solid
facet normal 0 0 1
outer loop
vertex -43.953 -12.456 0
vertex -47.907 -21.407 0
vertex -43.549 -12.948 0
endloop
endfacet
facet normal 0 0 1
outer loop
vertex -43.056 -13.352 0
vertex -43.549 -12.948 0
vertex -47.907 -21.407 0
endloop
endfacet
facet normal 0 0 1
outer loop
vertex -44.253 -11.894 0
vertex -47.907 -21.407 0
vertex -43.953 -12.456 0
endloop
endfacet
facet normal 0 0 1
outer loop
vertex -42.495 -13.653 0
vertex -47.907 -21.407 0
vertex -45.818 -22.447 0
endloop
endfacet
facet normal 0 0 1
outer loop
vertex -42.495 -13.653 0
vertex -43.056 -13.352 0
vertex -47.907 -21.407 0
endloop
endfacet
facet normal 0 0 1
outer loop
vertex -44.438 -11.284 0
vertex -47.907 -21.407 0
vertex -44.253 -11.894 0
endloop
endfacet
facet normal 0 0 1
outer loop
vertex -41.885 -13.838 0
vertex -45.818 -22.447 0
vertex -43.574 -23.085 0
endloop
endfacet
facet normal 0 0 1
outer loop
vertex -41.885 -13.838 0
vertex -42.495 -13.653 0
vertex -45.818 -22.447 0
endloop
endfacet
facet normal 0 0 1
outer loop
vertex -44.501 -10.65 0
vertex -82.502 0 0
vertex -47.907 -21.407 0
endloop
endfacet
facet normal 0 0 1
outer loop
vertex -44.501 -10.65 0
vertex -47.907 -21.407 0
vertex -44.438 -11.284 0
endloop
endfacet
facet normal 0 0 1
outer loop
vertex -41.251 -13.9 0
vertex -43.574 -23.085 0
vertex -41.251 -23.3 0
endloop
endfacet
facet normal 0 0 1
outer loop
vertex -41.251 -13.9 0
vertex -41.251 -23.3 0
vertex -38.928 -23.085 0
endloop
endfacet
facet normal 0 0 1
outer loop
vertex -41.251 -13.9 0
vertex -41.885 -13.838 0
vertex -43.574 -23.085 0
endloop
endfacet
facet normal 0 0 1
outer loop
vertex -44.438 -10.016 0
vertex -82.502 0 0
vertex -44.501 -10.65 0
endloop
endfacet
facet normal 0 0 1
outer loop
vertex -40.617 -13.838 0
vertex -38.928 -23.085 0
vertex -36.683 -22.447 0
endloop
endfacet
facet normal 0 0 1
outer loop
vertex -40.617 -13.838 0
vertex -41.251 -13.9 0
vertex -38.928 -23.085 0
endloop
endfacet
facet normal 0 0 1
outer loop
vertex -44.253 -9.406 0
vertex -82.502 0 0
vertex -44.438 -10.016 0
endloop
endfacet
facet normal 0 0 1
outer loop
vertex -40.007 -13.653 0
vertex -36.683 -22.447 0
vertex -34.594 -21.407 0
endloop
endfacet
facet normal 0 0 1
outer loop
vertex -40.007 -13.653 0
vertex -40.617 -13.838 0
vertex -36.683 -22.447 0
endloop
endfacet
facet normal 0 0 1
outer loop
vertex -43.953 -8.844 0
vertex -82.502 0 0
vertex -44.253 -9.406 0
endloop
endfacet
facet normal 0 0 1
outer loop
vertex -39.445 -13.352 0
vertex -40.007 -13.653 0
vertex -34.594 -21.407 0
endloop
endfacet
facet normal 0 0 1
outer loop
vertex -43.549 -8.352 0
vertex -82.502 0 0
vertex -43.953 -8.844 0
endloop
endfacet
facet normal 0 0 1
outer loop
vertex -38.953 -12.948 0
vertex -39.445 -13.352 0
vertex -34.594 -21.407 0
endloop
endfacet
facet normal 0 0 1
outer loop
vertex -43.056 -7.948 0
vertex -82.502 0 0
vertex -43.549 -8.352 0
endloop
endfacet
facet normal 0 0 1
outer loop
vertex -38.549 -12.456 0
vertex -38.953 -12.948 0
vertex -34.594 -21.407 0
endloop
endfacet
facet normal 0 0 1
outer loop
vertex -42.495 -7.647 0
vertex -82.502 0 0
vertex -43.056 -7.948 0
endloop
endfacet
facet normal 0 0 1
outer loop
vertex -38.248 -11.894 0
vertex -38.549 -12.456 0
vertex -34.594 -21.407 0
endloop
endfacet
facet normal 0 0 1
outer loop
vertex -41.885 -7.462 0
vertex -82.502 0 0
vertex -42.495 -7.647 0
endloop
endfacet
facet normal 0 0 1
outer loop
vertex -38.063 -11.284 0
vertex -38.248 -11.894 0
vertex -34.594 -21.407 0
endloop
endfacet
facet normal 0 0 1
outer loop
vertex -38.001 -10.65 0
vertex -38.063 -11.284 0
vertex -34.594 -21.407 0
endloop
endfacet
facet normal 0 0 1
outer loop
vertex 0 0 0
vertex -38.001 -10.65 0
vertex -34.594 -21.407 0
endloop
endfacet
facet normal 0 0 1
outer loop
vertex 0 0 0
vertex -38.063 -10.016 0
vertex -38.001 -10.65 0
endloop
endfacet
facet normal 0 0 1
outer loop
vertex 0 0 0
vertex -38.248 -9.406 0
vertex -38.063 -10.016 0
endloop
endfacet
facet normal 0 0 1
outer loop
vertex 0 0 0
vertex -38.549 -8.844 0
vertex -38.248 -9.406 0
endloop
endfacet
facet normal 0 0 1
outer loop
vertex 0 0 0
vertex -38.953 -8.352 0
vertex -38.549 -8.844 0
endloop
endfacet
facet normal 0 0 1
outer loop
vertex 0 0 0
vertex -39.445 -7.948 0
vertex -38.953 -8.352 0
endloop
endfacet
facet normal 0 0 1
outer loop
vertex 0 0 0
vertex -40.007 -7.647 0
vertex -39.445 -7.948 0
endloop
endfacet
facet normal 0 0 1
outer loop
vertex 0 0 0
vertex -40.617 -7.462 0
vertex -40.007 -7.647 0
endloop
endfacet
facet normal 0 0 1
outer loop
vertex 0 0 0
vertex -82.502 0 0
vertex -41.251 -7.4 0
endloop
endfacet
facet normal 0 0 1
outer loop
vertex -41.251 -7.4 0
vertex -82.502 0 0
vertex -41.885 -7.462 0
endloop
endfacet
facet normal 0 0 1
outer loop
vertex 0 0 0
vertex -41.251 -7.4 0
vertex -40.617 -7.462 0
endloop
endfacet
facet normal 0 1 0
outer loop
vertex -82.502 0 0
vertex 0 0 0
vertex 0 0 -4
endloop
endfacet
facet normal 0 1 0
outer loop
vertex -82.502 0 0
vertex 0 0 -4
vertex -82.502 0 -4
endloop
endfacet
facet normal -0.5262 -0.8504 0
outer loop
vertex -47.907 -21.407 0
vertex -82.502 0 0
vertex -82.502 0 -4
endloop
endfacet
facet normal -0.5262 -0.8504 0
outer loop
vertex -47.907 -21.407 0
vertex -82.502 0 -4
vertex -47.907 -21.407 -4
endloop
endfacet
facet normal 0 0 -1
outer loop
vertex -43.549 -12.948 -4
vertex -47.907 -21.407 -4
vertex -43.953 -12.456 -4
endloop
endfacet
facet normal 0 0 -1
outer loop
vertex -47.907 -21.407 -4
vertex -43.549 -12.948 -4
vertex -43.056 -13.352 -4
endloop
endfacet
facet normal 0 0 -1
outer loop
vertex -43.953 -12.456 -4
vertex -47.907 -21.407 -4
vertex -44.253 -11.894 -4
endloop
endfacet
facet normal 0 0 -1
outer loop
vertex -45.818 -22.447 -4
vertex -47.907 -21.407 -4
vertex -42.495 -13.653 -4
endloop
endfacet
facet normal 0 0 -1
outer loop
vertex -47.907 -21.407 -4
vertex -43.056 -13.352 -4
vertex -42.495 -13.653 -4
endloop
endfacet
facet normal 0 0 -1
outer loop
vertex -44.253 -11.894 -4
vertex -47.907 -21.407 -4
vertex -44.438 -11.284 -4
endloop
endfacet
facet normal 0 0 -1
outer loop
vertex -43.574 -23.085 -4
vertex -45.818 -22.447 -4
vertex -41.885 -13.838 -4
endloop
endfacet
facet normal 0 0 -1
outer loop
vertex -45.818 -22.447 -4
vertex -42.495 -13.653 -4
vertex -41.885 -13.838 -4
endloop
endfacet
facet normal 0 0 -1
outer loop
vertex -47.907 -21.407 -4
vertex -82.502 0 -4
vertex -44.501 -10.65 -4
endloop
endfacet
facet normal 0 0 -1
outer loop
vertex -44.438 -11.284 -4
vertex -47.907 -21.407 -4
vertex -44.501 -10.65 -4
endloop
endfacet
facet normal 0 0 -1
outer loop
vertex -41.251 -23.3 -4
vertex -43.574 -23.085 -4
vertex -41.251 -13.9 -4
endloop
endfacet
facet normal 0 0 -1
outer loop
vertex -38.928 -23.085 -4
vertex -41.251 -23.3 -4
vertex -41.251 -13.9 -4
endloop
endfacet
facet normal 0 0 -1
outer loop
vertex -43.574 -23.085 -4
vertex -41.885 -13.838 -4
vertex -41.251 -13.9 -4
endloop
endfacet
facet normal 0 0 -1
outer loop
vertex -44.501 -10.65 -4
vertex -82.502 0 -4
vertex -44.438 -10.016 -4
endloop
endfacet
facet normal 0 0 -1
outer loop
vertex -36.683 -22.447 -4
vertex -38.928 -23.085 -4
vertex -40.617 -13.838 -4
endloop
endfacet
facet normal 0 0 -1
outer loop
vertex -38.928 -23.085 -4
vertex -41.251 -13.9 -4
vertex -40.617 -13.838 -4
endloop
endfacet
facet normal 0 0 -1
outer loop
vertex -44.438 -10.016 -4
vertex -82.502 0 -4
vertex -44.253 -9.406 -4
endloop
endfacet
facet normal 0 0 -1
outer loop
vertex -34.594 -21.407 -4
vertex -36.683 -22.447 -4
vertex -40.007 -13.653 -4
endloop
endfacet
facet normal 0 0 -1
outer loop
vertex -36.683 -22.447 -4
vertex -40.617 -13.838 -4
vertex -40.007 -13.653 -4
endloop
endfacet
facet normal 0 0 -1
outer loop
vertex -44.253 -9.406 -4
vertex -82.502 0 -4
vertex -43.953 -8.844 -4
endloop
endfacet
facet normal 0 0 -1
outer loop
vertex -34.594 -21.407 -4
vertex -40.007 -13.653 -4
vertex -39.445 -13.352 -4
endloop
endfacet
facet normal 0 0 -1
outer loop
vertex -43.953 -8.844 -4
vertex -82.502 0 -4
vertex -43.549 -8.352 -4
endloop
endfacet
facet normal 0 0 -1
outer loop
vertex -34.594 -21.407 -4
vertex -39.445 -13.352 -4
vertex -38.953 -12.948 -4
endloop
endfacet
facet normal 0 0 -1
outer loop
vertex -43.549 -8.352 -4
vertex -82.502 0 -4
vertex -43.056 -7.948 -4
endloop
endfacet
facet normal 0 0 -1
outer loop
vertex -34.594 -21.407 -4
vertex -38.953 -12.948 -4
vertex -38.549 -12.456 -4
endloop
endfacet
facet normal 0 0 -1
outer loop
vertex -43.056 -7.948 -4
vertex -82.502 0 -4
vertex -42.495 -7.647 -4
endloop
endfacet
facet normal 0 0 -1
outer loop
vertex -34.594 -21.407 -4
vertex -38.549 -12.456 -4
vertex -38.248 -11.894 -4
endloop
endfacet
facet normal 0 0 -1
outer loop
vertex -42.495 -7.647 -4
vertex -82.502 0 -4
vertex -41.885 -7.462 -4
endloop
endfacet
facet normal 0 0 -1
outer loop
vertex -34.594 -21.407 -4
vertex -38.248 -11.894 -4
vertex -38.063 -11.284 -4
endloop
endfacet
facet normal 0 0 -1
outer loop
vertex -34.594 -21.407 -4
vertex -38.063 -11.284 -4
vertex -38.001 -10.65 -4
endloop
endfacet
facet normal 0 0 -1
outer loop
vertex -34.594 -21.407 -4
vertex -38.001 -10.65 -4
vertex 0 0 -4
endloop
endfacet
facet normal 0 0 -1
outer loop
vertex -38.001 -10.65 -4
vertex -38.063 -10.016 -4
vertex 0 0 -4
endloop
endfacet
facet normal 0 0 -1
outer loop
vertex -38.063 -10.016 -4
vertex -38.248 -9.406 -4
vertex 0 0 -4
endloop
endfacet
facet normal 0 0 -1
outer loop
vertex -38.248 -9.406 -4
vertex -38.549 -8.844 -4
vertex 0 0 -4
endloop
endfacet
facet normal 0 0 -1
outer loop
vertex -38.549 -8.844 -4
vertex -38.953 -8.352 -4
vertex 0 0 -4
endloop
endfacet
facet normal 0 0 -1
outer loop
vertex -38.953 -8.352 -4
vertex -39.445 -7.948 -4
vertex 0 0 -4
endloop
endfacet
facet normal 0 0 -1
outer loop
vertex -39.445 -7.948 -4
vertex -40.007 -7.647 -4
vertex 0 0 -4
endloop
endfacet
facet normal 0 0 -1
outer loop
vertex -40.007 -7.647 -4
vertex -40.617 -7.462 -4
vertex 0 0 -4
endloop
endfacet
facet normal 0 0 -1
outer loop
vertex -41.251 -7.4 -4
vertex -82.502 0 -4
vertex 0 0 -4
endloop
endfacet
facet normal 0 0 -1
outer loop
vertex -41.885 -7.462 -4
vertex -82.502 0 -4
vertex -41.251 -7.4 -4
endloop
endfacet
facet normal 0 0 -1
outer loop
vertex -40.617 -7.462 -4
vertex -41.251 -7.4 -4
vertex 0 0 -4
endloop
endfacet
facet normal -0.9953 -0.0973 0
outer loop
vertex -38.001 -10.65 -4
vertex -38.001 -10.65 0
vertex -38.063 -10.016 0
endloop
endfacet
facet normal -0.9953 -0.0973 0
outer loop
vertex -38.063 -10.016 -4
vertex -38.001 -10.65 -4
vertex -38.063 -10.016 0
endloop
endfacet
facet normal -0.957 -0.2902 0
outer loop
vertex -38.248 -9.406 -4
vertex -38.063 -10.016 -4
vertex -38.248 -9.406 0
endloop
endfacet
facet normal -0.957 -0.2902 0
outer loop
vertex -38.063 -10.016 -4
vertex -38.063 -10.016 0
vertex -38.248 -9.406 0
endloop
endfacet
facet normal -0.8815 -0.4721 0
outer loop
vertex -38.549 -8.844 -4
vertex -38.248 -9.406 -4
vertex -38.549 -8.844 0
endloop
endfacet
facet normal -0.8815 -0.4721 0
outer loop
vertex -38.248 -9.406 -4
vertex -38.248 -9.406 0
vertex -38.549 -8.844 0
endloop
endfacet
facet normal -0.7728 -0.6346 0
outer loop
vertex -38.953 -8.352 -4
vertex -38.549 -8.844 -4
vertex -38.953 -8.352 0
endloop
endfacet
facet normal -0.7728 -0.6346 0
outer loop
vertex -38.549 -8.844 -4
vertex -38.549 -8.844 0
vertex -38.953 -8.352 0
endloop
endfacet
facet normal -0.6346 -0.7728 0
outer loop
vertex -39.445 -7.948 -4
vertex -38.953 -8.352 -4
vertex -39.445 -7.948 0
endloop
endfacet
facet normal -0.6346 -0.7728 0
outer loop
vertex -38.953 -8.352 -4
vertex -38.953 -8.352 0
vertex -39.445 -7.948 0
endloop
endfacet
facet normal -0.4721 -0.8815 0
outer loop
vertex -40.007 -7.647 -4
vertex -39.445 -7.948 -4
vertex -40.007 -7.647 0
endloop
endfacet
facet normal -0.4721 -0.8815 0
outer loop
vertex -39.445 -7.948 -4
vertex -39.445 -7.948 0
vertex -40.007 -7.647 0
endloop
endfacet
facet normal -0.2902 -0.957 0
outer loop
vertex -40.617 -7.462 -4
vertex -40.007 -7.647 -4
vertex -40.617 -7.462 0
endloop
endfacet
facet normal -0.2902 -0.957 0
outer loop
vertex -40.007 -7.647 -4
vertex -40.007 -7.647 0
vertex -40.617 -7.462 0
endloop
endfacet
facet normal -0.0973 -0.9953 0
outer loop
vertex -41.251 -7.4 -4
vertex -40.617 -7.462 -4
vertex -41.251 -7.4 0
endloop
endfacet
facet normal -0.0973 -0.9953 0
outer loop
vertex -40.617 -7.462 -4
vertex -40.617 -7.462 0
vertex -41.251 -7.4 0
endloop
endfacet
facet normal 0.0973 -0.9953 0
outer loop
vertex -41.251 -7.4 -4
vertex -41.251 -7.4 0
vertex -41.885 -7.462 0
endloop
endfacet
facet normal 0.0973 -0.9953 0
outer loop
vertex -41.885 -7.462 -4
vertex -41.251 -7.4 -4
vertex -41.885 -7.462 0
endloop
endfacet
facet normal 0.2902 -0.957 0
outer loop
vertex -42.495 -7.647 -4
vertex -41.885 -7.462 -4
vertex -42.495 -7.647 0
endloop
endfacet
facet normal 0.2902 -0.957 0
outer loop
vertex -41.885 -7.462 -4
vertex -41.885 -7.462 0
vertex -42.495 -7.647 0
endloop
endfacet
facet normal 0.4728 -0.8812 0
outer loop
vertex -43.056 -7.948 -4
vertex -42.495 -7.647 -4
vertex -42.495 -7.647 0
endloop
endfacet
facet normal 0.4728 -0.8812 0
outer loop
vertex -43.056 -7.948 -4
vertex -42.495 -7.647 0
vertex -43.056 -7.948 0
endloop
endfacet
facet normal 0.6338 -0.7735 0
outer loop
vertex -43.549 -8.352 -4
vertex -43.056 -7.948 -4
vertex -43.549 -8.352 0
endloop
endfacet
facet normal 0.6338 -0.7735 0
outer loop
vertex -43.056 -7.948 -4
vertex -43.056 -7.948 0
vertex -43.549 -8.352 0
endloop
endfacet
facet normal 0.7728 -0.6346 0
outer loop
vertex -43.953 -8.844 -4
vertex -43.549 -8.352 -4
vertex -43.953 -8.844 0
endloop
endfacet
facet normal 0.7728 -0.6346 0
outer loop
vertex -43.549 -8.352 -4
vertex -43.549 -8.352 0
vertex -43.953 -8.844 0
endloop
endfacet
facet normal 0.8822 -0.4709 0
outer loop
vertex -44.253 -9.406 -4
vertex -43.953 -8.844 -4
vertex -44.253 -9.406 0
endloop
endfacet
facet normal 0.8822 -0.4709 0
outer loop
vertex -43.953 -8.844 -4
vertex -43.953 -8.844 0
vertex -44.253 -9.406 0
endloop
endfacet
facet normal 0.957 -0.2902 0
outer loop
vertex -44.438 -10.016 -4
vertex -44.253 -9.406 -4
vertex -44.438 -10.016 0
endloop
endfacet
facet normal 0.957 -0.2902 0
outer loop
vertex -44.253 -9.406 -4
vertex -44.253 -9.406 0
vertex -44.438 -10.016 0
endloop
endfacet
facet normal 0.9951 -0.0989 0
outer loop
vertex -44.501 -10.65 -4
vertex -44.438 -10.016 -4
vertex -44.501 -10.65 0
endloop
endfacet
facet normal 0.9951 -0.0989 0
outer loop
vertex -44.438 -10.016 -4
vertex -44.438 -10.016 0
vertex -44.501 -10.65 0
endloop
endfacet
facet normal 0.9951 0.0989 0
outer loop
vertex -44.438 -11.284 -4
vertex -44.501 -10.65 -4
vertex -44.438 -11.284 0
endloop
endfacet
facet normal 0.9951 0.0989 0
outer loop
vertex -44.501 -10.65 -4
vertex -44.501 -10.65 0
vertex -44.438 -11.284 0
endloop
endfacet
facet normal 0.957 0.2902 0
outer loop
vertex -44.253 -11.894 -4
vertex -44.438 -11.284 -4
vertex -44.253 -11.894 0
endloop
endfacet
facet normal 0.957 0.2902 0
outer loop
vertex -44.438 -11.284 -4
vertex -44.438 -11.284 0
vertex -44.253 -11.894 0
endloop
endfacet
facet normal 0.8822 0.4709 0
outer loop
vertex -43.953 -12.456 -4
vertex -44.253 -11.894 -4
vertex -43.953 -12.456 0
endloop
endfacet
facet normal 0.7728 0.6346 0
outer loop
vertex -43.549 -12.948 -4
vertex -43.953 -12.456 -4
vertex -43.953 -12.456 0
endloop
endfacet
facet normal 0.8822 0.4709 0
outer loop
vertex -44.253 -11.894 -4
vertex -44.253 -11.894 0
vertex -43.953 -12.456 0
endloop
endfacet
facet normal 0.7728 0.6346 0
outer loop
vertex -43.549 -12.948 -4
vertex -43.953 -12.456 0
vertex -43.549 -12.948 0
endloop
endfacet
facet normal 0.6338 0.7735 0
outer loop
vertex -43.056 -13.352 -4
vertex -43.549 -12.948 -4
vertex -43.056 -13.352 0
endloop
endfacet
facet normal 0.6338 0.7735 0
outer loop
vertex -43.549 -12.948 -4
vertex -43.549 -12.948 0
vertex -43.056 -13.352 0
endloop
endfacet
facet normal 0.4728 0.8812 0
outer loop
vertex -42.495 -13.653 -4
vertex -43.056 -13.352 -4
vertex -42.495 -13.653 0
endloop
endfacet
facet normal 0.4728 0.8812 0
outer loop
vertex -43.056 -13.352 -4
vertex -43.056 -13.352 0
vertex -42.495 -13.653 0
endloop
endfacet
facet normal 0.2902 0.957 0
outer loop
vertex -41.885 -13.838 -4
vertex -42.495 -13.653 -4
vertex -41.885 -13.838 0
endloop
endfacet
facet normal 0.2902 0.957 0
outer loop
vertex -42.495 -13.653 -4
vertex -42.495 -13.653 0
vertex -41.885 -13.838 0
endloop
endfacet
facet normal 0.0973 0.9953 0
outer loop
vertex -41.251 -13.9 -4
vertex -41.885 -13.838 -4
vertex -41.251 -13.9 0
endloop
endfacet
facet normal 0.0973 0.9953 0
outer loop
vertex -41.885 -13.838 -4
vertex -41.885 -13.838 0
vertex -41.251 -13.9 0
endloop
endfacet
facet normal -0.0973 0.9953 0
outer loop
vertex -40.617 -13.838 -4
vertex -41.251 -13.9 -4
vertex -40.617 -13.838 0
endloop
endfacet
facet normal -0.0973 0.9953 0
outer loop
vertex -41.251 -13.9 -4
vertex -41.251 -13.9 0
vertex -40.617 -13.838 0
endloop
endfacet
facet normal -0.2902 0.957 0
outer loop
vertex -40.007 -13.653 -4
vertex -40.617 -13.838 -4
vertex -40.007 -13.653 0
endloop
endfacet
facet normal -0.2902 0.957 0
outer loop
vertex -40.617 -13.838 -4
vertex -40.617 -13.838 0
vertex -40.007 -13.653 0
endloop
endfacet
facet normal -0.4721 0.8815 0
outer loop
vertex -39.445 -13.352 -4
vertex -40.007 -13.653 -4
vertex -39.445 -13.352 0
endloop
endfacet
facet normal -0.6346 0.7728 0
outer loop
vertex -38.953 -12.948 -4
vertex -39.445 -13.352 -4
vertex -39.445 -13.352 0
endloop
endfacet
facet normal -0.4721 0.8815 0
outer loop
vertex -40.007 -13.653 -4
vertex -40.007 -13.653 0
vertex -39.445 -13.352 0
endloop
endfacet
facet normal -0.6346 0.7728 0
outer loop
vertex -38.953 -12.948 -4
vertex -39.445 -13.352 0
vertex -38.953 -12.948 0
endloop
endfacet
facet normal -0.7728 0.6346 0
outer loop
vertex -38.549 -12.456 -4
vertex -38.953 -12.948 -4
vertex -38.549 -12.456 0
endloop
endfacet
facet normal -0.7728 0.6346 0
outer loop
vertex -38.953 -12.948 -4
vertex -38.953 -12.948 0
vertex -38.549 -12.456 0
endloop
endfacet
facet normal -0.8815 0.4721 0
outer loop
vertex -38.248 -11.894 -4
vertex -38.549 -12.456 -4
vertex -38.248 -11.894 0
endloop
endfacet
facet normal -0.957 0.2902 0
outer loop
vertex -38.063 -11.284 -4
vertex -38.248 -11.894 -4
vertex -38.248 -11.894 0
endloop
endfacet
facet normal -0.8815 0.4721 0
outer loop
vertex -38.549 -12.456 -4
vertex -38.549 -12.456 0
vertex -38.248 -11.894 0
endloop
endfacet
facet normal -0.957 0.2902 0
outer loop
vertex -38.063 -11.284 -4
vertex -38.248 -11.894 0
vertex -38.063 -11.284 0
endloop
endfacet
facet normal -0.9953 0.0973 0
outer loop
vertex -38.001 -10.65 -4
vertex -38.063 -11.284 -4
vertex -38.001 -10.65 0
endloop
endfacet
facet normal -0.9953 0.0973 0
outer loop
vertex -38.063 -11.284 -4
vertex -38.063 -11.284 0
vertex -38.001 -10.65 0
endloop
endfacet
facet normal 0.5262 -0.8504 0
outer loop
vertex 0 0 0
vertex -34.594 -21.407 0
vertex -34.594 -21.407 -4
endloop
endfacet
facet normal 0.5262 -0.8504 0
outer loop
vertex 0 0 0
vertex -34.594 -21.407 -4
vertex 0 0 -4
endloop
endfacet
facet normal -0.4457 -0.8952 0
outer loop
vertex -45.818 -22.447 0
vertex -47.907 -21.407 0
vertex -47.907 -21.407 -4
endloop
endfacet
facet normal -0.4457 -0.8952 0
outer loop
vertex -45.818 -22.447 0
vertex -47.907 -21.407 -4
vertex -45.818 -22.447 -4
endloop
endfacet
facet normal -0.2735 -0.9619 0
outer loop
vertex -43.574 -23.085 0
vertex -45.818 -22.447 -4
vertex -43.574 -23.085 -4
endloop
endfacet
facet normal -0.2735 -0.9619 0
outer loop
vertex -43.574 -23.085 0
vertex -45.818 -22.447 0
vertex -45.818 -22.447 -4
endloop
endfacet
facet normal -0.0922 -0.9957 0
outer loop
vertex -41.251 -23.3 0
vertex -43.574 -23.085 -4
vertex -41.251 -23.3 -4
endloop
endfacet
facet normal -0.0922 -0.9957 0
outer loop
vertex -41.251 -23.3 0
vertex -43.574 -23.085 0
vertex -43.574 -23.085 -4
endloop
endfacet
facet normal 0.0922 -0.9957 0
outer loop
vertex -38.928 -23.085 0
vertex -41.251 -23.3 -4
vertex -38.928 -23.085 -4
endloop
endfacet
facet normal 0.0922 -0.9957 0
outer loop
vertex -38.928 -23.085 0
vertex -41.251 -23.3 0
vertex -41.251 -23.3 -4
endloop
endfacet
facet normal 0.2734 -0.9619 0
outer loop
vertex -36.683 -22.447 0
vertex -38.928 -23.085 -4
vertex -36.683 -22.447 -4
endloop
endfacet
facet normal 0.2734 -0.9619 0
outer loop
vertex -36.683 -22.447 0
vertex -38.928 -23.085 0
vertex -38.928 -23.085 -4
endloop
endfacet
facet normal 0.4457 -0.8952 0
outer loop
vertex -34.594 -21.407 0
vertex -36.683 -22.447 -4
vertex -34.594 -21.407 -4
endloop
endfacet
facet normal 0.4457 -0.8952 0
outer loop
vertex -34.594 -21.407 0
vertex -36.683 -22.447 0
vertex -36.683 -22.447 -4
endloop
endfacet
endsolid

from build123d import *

# Parameters (mm, degrees)
SKETCH_1_R             = 3.25
SM_BASE_FLANGE_1_DEPTH = 4


# Sheet-metal steps are written as plain solids
with BuildPart() as part:
    # Sketch 1 → Базовая кромка1 (new body)
    with BuildSketch(Plane.XY):
        with BuildLine():
            Line((-82.501667048, 0), (-47.907304338, -21.407039383))
            ThreePointArc((-47.907304338, -21.407039383), (-41.250833524, -23.3), (-34.594362709, -21.407039383))
            Line((-34.594362709, -21.407039383), (0, 0))
            Line((0, 0), (-82.501667048, 0))
        make_face()
        with Locations((-41.250833524, -10.65)):
            Circle(SKETCH_1_R, mode=Mode.SUBTRACT)
    extrude(amount=-SM_BASE_FLANGE_1_DEPTH)


solid = part.part
